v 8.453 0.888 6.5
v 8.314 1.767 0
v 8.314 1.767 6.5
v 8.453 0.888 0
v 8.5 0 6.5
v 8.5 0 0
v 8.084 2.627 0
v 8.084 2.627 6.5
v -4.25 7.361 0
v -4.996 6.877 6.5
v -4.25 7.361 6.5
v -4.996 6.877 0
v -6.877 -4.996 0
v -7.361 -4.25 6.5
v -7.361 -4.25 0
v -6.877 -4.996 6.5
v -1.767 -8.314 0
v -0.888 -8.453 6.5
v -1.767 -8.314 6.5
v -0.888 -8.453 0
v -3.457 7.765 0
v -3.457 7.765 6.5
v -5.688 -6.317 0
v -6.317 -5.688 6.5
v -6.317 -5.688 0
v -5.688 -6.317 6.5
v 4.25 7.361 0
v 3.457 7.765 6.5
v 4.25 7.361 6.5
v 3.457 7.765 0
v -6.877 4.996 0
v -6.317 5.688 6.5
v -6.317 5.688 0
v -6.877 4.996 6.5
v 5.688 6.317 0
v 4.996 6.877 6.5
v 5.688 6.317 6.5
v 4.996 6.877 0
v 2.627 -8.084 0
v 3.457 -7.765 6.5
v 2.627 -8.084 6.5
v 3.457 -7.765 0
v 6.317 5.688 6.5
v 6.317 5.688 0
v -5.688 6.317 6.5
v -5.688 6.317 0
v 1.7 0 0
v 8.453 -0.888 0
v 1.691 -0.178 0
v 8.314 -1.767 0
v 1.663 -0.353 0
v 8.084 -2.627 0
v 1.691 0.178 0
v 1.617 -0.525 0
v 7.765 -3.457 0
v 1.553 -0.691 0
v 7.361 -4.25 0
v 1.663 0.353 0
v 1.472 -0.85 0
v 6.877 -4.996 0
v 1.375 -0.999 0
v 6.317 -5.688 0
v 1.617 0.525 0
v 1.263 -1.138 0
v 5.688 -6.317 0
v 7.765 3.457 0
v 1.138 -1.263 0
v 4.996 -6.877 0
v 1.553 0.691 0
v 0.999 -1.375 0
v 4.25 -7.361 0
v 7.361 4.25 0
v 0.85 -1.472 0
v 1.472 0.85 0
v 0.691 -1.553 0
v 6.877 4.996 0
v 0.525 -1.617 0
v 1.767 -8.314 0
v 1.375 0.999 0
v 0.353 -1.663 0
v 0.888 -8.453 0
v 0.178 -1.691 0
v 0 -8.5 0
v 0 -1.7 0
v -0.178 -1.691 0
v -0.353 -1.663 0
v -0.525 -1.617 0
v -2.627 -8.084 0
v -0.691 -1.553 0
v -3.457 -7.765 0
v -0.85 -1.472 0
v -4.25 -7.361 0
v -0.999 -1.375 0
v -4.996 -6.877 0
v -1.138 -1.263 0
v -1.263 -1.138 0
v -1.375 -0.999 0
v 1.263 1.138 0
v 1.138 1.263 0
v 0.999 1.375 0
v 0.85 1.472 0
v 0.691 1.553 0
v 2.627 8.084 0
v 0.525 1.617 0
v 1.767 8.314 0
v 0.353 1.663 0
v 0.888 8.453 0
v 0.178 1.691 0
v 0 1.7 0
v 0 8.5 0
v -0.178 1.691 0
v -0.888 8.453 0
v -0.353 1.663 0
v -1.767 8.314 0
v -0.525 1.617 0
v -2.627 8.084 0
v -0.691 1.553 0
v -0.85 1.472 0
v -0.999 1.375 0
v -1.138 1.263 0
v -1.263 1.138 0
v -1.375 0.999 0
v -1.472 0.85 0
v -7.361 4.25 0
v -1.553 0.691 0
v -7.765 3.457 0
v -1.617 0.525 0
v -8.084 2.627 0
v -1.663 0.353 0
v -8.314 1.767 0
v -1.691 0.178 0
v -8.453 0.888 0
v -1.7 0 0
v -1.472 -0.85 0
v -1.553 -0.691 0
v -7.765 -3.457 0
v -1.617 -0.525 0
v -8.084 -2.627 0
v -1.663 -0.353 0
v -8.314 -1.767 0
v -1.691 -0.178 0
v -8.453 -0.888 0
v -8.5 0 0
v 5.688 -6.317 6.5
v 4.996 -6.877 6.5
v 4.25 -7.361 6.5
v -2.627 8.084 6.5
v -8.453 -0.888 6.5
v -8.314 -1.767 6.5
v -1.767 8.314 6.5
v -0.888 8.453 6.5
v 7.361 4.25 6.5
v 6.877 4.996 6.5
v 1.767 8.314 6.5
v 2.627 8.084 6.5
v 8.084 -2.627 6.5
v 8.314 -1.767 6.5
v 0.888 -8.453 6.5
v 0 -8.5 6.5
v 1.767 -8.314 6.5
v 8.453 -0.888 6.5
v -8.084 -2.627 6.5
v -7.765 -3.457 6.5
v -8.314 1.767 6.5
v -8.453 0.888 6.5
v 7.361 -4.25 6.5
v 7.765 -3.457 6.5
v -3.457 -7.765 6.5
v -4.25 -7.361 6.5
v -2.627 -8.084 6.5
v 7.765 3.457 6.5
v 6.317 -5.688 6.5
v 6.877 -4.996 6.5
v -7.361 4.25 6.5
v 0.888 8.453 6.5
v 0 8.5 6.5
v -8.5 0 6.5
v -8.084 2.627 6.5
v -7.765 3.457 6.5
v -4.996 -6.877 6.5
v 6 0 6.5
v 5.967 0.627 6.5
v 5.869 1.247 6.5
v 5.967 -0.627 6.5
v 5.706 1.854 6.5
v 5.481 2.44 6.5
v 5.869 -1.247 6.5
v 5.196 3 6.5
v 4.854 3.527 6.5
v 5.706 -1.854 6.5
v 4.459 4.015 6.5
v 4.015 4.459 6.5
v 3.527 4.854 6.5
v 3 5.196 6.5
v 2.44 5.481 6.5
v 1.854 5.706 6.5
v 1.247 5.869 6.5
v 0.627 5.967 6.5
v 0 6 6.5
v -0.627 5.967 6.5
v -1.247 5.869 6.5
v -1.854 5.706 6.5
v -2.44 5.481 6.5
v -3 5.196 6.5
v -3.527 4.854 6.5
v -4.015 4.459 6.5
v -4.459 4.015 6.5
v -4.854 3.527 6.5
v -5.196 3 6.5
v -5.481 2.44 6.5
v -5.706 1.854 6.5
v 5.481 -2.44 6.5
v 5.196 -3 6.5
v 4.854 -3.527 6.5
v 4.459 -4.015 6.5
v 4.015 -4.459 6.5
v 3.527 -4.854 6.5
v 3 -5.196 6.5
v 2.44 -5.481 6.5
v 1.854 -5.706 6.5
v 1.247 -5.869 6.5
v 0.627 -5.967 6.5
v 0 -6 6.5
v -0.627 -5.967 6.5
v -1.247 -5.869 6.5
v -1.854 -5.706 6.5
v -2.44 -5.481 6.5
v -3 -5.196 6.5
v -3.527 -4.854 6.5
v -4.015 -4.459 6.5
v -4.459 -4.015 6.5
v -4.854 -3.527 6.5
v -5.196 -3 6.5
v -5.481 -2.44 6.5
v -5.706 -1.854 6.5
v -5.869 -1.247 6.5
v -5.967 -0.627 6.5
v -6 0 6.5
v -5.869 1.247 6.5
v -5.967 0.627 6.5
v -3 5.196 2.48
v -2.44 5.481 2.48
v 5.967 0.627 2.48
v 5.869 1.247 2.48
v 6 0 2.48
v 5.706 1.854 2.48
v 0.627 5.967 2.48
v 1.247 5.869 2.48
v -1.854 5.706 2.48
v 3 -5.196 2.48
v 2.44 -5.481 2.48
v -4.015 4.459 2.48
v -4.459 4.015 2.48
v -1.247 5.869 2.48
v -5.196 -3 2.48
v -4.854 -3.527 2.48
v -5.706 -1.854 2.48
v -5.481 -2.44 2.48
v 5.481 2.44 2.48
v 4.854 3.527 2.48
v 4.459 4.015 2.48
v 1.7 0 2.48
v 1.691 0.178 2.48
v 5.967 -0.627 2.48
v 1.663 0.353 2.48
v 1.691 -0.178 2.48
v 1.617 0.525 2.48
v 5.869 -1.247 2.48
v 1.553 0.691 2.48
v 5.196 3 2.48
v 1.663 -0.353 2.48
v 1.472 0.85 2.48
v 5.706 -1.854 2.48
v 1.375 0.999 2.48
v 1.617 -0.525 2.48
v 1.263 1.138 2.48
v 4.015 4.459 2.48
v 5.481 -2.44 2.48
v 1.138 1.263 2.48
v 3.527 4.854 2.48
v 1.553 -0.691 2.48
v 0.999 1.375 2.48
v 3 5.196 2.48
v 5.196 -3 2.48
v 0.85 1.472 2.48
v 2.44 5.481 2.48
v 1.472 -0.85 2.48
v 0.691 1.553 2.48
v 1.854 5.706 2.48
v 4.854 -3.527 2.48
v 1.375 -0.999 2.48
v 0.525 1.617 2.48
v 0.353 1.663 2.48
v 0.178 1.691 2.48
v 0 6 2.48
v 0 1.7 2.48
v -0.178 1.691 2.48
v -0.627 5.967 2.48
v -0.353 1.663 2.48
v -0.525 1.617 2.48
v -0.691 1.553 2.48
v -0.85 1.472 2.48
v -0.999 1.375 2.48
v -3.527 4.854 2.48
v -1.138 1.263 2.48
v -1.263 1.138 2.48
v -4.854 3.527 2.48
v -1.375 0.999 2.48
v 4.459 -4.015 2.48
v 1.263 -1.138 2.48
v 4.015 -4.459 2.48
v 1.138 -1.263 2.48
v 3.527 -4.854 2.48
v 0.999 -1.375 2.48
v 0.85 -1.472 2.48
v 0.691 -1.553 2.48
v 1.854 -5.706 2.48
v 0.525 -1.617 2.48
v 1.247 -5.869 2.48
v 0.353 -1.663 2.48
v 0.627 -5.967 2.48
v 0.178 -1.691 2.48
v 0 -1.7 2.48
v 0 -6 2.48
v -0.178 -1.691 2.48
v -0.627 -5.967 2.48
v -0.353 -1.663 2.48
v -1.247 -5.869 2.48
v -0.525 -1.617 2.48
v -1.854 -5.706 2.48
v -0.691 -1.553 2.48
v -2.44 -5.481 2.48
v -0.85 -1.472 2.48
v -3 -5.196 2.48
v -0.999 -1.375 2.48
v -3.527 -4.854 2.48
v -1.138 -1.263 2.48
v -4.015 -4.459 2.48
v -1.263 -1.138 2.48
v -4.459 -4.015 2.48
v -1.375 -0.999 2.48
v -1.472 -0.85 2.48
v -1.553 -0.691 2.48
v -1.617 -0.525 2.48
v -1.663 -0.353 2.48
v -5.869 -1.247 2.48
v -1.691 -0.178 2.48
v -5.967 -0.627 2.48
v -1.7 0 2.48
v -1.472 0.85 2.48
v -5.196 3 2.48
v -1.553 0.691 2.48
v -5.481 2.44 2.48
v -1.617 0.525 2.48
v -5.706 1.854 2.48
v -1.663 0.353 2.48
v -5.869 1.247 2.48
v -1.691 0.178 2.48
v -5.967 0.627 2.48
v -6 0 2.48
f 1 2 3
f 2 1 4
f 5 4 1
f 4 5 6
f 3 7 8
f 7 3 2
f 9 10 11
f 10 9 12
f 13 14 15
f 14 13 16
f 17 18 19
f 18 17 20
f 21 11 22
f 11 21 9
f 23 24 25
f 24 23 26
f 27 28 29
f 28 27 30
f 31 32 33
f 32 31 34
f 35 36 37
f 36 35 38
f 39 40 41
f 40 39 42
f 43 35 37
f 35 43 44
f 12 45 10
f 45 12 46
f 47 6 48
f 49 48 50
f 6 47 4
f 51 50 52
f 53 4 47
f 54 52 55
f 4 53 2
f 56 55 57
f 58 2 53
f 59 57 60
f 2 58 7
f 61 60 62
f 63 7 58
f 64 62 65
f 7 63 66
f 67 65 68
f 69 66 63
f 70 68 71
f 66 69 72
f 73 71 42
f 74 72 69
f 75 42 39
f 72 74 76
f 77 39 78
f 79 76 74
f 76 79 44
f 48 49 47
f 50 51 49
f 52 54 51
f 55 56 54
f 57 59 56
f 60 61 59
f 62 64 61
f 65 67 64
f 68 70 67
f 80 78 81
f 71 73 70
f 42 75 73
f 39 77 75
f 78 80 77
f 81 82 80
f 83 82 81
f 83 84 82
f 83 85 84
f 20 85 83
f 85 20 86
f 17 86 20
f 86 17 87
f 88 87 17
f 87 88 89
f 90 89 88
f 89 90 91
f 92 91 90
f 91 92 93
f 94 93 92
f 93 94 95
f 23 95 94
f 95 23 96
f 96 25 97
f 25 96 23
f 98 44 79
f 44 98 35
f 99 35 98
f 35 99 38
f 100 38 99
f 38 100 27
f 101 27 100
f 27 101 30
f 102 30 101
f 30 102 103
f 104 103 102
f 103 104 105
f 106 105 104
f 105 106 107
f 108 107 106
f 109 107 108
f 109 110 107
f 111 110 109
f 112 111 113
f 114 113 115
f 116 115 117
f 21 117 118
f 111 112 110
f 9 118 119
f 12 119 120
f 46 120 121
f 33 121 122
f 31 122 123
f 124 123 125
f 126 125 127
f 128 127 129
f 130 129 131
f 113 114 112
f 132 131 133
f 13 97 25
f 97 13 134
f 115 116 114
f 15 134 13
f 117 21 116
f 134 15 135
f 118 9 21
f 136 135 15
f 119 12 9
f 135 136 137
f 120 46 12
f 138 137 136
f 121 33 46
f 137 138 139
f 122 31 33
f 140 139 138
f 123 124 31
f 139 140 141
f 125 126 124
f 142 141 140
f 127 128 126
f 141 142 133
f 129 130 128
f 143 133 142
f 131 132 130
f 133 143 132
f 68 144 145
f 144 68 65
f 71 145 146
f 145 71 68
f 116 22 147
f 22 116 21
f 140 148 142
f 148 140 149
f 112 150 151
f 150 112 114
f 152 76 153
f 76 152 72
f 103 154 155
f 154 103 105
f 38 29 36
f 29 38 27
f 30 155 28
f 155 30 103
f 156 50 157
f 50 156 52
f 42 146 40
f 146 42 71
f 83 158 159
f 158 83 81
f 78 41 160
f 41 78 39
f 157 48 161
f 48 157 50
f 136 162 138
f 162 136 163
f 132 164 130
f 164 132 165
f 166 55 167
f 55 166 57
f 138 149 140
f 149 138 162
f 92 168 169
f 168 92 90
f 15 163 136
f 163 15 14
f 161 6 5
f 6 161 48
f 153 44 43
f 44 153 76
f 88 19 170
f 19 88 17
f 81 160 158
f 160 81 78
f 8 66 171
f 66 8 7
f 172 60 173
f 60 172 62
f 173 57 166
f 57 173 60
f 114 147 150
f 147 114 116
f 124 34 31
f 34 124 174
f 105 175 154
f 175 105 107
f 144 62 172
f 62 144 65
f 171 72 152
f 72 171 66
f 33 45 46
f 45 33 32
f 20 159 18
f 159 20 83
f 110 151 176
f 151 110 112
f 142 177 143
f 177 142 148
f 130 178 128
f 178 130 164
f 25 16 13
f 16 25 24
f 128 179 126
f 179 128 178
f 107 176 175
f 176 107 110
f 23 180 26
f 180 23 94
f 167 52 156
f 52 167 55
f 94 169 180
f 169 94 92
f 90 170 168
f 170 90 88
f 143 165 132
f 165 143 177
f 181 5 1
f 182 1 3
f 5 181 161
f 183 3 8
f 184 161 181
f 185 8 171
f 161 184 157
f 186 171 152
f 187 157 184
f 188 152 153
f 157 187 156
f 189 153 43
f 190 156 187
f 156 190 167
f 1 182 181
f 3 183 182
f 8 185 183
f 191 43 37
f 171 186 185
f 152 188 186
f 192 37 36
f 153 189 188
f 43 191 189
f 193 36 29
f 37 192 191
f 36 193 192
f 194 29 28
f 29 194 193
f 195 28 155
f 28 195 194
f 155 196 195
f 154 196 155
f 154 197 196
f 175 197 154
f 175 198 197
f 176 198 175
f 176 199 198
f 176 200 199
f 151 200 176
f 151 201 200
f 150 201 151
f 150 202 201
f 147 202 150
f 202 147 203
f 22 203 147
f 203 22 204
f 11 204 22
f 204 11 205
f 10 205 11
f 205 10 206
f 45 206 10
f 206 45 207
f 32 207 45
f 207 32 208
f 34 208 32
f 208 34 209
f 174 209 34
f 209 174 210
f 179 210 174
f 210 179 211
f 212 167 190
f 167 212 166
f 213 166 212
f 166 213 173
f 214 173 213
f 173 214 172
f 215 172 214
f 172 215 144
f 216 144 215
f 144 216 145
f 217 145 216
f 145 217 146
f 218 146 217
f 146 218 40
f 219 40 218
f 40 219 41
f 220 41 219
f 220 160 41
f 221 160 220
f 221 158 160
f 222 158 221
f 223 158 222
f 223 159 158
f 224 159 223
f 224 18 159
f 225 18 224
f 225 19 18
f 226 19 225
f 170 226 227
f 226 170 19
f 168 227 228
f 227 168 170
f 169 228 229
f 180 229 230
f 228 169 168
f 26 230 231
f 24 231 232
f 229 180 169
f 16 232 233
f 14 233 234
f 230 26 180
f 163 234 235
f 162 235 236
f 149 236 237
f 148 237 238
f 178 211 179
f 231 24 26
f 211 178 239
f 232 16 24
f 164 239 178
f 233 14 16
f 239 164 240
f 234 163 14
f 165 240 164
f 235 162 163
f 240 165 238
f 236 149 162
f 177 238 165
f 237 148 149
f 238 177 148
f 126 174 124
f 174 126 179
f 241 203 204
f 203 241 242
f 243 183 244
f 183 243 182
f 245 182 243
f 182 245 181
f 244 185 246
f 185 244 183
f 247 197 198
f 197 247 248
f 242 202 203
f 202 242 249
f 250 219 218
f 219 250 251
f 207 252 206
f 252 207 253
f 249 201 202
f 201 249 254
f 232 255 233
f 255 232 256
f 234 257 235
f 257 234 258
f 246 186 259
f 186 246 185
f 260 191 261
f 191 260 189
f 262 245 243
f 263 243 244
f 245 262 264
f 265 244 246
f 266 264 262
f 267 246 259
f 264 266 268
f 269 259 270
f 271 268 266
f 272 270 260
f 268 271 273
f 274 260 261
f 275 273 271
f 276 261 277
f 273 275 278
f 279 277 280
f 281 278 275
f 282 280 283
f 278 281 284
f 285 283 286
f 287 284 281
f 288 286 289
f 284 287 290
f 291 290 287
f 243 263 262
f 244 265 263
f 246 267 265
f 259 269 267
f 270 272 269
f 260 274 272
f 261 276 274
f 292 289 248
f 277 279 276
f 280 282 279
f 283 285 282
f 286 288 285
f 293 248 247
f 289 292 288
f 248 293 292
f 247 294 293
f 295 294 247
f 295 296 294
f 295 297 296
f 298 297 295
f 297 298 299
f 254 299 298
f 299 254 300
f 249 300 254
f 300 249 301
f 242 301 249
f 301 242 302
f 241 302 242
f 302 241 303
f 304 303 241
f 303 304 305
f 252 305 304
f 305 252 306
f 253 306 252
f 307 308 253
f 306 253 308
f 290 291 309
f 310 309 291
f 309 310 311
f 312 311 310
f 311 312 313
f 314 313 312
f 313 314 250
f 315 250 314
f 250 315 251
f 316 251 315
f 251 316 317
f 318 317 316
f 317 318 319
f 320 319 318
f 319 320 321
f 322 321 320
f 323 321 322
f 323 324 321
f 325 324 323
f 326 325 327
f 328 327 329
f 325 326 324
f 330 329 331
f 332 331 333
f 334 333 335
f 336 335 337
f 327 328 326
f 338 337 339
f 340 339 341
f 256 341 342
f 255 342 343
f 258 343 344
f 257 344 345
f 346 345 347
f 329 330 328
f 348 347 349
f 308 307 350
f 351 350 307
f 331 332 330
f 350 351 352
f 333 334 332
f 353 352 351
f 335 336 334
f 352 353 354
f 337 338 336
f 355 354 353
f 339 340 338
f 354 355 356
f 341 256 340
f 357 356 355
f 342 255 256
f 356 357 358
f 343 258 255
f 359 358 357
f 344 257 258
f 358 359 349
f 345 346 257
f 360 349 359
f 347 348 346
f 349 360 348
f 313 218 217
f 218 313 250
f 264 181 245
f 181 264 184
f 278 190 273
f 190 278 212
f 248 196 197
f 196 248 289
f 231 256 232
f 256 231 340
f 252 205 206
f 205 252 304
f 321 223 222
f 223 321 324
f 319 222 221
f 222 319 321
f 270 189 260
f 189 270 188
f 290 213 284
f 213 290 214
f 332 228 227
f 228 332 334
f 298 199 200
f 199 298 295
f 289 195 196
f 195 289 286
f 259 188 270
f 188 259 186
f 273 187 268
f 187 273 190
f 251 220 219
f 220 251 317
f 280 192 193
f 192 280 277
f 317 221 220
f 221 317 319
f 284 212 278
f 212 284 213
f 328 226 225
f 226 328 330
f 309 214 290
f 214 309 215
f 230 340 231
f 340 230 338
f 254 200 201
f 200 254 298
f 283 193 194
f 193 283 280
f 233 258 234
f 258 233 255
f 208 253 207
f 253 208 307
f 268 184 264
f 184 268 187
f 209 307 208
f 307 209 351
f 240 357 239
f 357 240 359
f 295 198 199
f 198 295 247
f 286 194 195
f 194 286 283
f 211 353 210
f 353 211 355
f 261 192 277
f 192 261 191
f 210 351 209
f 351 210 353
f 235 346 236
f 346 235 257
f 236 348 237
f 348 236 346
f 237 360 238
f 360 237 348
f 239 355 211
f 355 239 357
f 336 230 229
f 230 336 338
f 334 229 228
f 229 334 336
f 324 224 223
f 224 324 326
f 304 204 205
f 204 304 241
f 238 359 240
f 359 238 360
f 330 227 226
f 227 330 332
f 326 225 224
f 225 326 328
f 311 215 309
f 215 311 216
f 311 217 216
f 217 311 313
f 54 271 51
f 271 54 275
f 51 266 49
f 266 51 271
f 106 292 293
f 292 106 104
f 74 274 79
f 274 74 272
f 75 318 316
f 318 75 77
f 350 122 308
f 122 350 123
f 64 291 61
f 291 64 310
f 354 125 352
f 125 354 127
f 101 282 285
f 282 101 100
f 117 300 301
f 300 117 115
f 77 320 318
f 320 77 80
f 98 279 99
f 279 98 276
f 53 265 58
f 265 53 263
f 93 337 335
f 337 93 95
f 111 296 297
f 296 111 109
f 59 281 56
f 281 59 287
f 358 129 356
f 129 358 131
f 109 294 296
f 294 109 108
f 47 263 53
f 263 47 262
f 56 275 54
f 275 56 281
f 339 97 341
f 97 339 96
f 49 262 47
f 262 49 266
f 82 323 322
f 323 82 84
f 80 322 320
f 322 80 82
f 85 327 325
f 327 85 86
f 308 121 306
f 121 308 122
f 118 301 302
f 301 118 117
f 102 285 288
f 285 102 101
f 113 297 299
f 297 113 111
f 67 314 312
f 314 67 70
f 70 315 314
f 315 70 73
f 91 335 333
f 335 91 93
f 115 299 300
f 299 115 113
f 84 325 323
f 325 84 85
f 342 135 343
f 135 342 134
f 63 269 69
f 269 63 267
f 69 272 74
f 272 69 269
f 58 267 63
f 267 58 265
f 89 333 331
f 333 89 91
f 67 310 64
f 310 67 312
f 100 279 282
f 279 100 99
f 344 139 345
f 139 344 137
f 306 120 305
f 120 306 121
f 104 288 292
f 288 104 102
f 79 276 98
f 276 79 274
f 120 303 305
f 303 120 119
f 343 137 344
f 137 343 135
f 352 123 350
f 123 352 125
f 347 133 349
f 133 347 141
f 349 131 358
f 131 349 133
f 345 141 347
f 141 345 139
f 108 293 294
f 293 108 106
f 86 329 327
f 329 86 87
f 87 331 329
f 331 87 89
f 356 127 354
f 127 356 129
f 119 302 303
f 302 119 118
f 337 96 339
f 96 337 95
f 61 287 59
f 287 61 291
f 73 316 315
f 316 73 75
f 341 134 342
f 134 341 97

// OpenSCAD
// Recessed magnet cup.
$fn = 60;
eps = 0.02;
magnet_d = 12;
wall = 2.5;
outer_d = magnet_d+2*wall;
height = wall+4;
difference() {
    cylinder(d=outer_d,h=height);
    translate([0,0,wall-eps]) cylinder(d=magnet_d,h=height-wall+2*eps);
    translate([0,0,-eps]) cylinder(d=3.4,h=wall+2*eps);
}
